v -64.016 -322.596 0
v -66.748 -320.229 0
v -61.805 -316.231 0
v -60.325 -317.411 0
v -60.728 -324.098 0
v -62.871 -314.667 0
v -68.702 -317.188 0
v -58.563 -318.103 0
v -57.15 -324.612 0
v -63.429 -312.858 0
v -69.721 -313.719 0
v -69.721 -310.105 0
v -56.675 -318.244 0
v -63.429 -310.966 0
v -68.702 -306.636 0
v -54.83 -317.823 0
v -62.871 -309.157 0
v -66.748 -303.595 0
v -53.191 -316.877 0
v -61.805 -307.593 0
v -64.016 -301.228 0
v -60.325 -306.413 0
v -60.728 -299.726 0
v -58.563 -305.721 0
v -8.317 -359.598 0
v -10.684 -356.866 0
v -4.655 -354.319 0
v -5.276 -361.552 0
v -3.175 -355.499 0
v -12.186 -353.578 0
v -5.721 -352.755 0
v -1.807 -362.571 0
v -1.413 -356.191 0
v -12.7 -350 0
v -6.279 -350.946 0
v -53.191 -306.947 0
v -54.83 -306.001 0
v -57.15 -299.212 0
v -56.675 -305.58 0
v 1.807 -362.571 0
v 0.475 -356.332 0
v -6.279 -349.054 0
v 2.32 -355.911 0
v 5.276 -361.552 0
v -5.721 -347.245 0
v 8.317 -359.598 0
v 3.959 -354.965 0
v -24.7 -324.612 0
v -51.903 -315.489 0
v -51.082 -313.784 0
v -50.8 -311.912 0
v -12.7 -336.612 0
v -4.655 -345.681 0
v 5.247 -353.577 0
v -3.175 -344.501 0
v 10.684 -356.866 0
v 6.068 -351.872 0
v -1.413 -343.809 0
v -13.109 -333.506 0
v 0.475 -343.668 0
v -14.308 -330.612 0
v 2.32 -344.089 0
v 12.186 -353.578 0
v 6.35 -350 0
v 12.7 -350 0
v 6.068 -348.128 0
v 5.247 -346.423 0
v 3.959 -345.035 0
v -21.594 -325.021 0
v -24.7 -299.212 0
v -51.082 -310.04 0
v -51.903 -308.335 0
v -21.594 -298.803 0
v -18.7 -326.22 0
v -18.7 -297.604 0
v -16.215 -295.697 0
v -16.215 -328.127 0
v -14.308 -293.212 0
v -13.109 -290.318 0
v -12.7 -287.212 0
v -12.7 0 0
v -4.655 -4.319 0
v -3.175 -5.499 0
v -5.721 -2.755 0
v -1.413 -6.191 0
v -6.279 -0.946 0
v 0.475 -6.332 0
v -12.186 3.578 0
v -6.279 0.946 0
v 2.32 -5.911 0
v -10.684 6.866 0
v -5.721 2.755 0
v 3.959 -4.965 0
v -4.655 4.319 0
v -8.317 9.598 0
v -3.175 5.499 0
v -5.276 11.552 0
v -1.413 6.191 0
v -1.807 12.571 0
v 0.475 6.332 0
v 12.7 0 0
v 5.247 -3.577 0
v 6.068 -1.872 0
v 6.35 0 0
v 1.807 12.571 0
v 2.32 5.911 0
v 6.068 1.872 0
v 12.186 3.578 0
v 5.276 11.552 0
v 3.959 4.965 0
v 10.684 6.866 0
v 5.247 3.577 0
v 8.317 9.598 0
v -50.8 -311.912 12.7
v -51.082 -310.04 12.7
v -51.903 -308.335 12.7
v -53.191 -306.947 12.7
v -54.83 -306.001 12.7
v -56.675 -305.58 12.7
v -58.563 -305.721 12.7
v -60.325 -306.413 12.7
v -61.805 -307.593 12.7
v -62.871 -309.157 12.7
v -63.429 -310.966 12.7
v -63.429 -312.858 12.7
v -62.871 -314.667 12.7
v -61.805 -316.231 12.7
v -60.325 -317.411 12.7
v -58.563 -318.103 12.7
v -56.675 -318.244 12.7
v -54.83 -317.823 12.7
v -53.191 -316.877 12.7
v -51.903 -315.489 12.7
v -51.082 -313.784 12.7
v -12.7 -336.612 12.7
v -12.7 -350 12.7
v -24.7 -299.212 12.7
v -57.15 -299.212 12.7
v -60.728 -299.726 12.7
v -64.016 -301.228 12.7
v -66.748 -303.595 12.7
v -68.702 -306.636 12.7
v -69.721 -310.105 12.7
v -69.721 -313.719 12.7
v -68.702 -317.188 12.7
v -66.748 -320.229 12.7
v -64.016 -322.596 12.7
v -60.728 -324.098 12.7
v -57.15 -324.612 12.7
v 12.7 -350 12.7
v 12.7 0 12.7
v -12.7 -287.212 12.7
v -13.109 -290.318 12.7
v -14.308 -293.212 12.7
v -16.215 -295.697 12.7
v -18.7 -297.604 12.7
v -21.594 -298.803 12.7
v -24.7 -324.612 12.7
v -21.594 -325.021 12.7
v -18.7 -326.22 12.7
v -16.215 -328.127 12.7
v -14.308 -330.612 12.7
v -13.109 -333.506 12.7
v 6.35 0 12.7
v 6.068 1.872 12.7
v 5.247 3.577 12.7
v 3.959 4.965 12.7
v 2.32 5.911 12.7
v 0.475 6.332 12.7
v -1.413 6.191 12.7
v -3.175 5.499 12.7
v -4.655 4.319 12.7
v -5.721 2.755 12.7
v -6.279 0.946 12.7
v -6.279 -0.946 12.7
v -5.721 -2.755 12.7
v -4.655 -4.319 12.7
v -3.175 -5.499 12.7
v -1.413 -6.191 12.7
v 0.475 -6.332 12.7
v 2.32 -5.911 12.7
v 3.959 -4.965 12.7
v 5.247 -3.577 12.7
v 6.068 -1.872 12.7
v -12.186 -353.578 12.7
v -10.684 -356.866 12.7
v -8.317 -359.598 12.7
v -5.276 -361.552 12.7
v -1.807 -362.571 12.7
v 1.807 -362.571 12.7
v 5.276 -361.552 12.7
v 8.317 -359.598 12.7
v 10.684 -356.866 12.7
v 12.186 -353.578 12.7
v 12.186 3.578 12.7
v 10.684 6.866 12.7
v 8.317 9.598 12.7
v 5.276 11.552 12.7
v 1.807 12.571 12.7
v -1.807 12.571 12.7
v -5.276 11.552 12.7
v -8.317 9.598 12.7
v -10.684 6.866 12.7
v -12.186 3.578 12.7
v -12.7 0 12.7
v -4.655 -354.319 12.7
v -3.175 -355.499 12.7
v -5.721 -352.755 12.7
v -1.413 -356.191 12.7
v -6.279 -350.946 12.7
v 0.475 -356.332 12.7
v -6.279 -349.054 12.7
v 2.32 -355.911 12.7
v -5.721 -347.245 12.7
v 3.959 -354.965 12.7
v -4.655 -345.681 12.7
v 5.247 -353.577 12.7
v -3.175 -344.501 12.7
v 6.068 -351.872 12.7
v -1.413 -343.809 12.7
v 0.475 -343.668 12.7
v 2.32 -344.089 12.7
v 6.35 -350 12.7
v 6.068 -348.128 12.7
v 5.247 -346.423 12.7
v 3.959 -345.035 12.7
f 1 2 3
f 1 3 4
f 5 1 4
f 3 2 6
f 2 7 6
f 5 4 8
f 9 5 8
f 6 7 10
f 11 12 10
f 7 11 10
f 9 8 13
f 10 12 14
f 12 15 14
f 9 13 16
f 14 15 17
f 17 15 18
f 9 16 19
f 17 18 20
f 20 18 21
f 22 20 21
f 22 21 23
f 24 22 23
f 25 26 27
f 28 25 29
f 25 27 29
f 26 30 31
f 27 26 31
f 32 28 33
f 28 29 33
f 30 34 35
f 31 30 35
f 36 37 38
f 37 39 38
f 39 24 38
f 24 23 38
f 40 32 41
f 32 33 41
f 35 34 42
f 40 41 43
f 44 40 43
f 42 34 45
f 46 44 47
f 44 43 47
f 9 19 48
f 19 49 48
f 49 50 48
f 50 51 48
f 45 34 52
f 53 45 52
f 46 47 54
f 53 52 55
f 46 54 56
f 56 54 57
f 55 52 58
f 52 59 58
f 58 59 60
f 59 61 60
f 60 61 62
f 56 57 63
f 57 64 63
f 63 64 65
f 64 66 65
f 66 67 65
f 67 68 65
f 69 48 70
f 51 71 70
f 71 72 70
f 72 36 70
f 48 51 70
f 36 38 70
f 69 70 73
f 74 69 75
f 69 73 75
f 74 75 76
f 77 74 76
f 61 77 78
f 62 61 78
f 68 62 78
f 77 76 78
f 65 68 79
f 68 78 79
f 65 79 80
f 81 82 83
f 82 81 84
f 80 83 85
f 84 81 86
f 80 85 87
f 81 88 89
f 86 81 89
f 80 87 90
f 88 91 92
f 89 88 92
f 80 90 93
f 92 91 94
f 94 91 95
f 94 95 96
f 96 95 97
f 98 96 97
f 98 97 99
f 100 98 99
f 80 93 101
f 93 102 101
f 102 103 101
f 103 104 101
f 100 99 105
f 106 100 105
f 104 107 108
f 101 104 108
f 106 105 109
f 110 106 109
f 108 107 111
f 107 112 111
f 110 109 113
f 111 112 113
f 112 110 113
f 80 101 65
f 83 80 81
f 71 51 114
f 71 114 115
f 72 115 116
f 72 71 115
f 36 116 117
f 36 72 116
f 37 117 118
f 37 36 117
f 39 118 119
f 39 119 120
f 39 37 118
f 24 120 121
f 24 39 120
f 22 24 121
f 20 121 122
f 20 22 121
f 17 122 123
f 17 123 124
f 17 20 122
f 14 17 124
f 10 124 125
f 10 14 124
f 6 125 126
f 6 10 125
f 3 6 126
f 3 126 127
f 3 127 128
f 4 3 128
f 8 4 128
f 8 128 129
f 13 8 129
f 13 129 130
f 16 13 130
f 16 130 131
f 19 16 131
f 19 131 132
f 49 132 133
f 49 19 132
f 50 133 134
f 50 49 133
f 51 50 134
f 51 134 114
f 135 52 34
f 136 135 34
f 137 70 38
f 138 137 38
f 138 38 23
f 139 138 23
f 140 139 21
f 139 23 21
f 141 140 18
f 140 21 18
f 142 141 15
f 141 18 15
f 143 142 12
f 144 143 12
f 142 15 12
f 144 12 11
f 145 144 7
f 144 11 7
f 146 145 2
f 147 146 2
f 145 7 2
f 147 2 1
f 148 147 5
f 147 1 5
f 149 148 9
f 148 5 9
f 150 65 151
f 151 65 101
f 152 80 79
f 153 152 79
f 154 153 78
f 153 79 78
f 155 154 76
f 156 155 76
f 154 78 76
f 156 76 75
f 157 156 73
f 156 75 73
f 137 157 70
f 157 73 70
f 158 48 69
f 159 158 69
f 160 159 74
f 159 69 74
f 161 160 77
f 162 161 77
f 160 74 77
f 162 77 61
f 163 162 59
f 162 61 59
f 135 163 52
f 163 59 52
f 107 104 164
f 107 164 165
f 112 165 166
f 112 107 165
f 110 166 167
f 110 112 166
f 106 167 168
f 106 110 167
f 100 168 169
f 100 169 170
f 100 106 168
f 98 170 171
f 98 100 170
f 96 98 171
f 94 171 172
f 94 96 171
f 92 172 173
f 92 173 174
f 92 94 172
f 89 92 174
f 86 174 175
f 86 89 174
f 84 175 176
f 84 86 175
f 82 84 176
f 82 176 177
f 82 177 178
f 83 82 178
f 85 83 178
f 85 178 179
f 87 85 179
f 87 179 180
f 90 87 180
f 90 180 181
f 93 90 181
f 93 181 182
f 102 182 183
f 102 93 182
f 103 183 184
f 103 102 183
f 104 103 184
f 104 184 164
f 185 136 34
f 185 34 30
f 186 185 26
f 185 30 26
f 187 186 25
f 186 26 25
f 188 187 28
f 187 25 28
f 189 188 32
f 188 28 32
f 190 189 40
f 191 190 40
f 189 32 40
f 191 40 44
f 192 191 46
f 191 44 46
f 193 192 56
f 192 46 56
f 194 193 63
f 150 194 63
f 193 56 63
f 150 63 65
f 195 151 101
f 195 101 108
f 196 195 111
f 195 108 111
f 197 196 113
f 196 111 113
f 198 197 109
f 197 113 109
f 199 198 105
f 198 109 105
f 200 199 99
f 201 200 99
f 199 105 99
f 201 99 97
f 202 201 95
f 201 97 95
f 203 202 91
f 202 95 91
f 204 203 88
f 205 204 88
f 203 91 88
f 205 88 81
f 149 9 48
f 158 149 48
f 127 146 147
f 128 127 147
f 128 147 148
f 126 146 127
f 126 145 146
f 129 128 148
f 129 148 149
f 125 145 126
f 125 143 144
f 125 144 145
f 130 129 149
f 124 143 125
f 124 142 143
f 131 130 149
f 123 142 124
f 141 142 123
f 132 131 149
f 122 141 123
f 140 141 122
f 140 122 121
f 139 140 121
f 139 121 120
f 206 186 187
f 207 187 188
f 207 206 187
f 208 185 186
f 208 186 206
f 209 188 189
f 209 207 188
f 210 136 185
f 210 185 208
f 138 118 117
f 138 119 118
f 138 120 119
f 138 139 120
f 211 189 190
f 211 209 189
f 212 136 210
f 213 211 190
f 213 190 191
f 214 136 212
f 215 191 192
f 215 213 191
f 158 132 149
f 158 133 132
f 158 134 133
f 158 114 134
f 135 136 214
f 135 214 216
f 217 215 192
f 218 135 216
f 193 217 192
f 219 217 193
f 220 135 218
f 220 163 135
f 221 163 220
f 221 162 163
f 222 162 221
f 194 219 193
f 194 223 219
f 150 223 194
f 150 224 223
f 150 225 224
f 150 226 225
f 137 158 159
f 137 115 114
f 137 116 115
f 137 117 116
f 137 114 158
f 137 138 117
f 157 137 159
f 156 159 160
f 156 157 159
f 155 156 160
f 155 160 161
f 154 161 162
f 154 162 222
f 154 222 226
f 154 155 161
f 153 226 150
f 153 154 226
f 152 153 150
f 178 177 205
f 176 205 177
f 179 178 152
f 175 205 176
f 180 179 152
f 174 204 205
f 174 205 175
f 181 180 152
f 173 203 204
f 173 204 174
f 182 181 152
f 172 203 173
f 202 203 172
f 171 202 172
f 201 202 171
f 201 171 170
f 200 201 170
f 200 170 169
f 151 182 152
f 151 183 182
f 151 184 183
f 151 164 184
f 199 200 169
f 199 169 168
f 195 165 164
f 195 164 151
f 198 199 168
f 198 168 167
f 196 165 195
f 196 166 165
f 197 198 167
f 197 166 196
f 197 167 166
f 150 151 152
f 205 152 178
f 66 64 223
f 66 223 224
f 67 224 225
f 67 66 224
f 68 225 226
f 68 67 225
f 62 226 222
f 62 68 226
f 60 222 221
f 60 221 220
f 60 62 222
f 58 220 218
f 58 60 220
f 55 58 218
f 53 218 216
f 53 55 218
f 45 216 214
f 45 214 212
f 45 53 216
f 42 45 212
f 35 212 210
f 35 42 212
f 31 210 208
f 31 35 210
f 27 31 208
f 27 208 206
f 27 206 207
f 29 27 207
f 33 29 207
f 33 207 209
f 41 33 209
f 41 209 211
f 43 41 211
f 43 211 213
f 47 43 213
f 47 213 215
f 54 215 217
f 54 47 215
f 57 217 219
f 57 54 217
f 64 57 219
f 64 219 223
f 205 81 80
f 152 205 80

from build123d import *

# Parameters (mm, degrees)
SKETCH1_R           = 6.35
BOSS_EXTRUDE3_DEPTH = 12.7


with BuildPart() as part:
    # Sketch1 → Boss-Extrude3 (new body)
    with BuildSketch(Plane.XY):
        with BuildLine():
            Line((-12.7, -336.612), (-12.7, -350))
            ThreePointArc((-12.7, -350), (0, -362.7), (12.7, -350))
            Line((12.7, -350), (12.7, 0))
            ThreePointArc((12.7, 0), (0, 12.7), (-12.7, 0))
            Line((-12.7, 0), (-12.7, -287.212))
            ThreePointArc((-12.7, -287.212), (-16.214718626, -295.697281374), (-24.7, -299.212))
            Line((-24.7, -299.212), (-57.15, -299.212))
            ThreePointArc((-57.15, -299.212), (-69.85, -311.912), (-57.15, -324.612))
            Line((-57.15, -324.612), (-24.7, -324.612))
            ThreePointArc((-24.7, -324.612), (-16.214718626, -328.126718626), (-12.7, -336.612))
        make_face()
        Circle(SKETCH1_R, mode=Mode.SUBTRACT)
        with Locations((-57.15, -311.912)):
            Circle(SKETCH1_R, mode=Mode.SUBTRACT)
        with Locations((0, -350)):
            Circle(SKETCH1_R, mode=Mode.SUBTRACT)
    extrude(amount=BOSS_EXTRUDE3_DEPTH)


solid = part.part
